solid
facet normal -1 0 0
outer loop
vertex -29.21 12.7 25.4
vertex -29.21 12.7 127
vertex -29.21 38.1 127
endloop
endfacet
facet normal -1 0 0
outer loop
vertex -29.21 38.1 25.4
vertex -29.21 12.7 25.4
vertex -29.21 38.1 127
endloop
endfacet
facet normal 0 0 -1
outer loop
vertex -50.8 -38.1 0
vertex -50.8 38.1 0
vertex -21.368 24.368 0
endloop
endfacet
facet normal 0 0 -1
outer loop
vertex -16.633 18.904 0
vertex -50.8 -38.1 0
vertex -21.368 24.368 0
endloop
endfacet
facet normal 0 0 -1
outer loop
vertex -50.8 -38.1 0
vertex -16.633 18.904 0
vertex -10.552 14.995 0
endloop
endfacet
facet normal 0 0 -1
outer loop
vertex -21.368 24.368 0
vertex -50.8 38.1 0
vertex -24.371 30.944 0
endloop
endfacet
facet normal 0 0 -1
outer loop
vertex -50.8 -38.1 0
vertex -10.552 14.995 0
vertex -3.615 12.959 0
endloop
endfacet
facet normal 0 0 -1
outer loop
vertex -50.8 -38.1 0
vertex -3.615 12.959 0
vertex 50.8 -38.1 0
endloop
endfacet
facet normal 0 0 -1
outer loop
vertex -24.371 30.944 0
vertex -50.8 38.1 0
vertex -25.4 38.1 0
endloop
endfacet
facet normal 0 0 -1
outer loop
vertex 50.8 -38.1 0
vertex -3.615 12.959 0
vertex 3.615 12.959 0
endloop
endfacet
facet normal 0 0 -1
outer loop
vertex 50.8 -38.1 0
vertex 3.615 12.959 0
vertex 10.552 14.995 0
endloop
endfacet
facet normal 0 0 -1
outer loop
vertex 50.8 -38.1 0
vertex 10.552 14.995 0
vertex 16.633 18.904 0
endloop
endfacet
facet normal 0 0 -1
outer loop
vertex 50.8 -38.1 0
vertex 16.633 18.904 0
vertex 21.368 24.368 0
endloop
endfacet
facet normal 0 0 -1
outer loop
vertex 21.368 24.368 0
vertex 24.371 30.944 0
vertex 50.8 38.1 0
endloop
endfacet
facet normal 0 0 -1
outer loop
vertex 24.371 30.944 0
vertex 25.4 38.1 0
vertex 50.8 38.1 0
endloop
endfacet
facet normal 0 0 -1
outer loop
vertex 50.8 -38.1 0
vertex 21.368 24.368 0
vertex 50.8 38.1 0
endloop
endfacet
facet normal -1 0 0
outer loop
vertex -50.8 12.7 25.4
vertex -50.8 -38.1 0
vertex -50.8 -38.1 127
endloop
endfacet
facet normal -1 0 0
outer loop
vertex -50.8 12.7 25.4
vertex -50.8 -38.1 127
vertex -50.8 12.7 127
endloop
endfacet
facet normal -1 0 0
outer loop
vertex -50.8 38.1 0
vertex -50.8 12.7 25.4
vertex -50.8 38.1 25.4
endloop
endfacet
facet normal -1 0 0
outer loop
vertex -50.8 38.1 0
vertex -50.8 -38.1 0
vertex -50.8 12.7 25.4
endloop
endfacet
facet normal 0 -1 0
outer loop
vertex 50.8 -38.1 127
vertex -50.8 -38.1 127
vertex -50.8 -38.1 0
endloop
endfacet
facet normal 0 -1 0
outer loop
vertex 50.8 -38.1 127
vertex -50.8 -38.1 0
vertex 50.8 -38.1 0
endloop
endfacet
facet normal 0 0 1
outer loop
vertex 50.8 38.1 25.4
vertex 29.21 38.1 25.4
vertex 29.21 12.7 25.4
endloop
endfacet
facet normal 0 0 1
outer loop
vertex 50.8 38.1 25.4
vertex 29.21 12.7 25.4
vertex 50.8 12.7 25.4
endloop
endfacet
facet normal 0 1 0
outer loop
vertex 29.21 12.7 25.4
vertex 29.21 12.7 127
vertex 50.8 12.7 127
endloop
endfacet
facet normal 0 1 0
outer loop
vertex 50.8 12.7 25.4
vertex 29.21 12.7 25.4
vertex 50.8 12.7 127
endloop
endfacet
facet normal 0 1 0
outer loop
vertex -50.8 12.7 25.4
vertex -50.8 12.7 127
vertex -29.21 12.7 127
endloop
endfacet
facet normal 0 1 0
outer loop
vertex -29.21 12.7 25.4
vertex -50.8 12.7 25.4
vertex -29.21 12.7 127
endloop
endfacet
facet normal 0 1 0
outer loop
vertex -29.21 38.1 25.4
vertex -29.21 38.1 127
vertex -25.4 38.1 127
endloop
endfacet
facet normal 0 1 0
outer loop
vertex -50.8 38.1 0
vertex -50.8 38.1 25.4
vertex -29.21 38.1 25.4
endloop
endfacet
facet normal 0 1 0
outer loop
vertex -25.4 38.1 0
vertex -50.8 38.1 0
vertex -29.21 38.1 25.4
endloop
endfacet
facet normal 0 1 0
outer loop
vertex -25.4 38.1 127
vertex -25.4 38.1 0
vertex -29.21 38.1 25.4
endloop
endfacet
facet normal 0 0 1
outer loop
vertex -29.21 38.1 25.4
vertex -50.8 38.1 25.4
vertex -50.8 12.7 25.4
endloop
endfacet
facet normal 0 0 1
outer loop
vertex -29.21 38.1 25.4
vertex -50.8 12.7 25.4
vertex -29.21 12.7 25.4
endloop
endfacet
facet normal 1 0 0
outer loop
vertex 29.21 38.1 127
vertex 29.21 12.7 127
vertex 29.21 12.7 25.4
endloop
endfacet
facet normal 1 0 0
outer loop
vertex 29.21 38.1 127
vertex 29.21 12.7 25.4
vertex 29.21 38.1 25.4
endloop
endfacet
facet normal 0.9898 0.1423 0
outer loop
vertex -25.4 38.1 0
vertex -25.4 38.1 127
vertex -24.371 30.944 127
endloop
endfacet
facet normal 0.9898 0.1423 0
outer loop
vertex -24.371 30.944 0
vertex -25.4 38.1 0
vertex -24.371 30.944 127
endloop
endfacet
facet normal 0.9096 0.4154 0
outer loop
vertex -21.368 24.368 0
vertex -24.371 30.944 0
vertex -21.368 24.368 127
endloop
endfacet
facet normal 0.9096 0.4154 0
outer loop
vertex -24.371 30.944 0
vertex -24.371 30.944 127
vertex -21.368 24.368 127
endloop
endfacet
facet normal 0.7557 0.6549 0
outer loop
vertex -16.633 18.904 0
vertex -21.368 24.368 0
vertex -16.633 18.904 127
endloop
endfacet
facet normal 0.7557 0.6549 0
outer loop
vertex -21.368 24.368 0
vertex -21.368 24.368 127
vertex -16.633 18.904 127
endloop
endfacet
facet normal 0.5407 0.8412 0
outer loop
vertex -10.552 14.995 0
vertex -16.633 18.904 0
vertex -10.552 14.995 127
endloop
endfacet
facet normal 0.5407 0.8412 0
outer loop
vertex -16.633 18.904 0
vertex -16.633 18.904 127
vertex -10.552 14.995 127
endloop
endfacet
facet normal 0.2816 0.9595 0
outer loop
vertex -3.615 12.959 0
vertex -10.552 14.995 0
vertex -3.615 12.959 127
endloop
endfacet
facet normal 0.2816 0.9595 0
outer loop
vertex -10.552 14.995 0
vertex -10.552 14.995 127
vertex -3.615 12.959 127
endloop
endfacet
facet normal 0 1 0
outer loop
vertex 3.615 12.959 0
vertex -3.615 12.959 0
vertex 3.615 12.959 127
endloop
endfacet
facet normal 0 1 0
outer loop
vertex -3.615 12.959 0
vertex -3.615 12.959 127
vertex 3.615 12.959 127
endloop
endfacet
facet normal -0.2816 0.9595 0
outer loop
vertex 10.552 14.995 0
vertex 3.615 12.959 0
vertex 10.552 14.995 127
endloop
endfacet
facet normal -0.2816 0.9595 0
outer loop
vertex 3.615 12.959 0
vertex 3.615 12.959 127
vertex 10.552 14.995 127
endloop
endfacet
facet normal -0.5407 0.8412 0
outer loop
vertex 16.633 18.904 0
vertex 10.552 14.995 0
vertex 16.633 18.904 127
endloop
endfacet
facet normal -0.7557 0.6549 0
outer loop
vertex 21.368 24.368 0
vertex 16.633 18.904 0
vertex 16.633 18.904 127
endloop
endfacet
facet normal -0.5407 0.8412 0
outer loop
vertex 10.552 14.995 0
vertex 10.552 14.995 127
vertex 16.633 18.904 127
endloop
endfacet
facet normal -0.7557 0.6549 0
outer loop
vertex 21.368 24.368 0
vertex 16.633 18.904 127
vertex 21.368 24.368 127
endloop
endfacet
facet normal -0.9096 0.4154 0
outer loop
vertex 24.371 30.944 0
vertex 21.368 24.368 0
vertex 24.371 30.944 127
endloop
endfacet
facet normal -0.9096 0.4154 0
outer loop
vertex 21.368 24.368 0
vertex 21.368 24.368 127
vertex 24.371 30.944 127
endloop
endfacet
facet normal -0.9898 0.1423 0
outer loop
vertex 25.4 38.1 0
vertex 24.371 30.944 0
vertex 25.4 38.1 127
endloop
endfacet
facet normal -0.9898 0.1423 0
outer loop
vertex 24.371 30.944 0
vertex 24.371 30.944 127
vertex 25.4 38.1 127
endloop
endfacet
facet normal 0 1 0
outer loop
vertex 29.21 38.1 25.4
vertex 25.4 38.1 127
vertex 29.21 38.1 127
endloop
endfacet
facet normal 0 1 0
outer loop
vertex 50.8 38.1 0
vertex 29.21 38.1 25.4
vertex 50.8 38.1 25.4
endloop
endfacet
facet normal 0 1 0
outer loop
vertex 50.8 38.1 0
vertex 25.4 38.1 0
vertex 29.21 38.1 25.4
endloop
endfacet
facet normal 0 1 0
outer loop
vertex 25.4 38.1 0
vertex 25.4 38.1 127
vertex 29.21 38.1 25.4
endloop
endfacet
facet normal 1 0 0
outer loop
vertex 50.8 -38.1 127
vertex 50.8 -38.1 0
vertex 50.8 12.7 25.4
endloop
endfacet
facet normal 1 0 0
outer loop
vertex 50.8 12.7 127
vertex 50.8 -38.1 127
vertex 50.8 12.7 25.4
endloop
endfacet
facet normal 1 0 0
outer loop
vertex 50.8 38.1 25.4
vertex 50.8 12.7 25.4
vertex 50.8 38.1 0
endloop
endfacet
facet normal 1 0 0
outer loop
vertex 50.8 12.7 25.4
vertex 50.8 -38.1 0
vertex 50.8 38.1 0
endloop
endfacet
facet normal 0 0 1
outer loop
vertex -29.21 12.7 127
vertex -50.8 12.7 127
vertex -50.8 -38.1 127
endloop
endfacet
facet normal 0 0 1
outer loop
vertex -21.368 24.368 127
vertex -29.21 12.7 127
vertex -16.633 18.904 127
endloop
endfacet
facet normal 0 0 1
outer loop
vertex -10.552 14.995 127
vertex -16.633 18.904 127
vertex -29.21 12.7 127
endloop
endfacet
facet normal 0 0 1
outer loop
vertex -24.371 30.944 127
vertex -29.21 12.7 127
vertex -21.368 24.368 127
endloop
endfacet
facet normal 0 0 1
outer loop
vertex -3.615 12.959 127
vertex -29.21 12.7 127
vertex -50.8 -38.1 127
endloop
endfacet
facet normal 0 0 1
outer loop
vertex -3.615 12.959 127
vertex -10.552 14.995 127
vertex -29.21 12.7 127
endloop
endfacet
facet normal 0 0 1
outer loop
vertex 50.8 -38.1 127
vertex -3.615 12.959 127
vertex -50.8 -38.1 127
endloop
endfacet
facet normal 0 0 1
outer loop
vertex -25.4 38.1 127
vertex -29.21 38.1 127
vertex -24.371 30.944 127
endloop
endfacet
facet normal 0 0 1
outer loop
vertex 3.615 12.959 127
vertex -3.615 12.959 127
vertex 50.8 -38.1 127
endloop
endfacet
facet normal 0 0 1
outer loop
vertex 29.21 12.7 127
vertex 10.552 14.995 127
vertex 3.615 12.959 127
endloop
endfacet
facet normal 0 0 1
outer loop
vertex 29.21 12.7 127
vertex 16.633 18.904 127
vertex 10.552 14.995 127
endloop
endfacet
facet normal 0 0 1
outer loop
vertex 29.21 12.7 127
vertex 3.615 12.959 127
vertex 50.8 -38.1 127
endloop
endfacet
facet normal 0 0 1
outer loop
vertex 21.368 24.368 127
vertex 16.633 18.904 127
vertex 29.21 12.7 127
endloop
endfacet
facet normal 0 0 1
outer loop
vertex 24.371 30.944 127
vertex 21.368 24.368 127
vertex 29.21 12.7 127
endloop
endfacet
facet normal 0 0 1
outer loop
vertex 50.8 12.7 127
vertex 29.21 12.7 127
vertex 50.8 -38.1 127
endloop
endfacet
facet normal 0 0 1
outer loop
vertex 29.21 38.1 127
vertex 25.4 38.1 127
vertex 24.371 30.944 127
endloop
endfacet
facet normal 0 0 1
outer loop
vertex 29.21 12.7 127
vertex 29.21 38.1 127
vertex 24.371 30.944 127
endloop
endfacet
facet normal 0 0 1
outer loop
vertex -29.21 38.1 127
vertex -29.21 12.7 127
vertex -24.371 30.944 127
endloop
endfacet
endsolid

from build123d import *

# Parameters (mm, degrees)
F0_W     = 101.6
F0_H     = 76.2
F1_DEPTH = 127
F3_DEPTH = 127.001
F4_W     = 21.5898367196
F4_H     = 25.4
F5_DEPTH = 101.6


with BuildPart() as f1:
    # F0 (on Top) → F1 (new body)
    with BuildSketch(Plane.XY):
        Rectangle(F0_W, F0_H)
    extrude(amount=F1_DEPTH)

    # F2 (on face) → F3 (cut, through all)
    with BuildSketch(Plane.XY.offset(127)):
        with BuildLine():
            ThreePointArc((-25.4, 38.1), (0, 12.7), (25.4, 38.1))
            Line((25.4, 38.1), (-25.4, 38.1))
        make_face()
    extrude(amount=-F3_DEPTH, mode=Mode.SUBTRACT)

    # F4 (on face) → F5 (cut)
    with BuildSketch(Plane.XY.offset(127)):
        with Locations((-40.0050816402, 25.4)):
            Rectangle(F4_W, F4_H)
        with Locations((40.0050816402, 25.4)):
            Rectangle(F4_W, F4_H)
    extrude(amount=-F5_DEPTH, mode=Mode.SUBTRACT)


solid = f1.part
